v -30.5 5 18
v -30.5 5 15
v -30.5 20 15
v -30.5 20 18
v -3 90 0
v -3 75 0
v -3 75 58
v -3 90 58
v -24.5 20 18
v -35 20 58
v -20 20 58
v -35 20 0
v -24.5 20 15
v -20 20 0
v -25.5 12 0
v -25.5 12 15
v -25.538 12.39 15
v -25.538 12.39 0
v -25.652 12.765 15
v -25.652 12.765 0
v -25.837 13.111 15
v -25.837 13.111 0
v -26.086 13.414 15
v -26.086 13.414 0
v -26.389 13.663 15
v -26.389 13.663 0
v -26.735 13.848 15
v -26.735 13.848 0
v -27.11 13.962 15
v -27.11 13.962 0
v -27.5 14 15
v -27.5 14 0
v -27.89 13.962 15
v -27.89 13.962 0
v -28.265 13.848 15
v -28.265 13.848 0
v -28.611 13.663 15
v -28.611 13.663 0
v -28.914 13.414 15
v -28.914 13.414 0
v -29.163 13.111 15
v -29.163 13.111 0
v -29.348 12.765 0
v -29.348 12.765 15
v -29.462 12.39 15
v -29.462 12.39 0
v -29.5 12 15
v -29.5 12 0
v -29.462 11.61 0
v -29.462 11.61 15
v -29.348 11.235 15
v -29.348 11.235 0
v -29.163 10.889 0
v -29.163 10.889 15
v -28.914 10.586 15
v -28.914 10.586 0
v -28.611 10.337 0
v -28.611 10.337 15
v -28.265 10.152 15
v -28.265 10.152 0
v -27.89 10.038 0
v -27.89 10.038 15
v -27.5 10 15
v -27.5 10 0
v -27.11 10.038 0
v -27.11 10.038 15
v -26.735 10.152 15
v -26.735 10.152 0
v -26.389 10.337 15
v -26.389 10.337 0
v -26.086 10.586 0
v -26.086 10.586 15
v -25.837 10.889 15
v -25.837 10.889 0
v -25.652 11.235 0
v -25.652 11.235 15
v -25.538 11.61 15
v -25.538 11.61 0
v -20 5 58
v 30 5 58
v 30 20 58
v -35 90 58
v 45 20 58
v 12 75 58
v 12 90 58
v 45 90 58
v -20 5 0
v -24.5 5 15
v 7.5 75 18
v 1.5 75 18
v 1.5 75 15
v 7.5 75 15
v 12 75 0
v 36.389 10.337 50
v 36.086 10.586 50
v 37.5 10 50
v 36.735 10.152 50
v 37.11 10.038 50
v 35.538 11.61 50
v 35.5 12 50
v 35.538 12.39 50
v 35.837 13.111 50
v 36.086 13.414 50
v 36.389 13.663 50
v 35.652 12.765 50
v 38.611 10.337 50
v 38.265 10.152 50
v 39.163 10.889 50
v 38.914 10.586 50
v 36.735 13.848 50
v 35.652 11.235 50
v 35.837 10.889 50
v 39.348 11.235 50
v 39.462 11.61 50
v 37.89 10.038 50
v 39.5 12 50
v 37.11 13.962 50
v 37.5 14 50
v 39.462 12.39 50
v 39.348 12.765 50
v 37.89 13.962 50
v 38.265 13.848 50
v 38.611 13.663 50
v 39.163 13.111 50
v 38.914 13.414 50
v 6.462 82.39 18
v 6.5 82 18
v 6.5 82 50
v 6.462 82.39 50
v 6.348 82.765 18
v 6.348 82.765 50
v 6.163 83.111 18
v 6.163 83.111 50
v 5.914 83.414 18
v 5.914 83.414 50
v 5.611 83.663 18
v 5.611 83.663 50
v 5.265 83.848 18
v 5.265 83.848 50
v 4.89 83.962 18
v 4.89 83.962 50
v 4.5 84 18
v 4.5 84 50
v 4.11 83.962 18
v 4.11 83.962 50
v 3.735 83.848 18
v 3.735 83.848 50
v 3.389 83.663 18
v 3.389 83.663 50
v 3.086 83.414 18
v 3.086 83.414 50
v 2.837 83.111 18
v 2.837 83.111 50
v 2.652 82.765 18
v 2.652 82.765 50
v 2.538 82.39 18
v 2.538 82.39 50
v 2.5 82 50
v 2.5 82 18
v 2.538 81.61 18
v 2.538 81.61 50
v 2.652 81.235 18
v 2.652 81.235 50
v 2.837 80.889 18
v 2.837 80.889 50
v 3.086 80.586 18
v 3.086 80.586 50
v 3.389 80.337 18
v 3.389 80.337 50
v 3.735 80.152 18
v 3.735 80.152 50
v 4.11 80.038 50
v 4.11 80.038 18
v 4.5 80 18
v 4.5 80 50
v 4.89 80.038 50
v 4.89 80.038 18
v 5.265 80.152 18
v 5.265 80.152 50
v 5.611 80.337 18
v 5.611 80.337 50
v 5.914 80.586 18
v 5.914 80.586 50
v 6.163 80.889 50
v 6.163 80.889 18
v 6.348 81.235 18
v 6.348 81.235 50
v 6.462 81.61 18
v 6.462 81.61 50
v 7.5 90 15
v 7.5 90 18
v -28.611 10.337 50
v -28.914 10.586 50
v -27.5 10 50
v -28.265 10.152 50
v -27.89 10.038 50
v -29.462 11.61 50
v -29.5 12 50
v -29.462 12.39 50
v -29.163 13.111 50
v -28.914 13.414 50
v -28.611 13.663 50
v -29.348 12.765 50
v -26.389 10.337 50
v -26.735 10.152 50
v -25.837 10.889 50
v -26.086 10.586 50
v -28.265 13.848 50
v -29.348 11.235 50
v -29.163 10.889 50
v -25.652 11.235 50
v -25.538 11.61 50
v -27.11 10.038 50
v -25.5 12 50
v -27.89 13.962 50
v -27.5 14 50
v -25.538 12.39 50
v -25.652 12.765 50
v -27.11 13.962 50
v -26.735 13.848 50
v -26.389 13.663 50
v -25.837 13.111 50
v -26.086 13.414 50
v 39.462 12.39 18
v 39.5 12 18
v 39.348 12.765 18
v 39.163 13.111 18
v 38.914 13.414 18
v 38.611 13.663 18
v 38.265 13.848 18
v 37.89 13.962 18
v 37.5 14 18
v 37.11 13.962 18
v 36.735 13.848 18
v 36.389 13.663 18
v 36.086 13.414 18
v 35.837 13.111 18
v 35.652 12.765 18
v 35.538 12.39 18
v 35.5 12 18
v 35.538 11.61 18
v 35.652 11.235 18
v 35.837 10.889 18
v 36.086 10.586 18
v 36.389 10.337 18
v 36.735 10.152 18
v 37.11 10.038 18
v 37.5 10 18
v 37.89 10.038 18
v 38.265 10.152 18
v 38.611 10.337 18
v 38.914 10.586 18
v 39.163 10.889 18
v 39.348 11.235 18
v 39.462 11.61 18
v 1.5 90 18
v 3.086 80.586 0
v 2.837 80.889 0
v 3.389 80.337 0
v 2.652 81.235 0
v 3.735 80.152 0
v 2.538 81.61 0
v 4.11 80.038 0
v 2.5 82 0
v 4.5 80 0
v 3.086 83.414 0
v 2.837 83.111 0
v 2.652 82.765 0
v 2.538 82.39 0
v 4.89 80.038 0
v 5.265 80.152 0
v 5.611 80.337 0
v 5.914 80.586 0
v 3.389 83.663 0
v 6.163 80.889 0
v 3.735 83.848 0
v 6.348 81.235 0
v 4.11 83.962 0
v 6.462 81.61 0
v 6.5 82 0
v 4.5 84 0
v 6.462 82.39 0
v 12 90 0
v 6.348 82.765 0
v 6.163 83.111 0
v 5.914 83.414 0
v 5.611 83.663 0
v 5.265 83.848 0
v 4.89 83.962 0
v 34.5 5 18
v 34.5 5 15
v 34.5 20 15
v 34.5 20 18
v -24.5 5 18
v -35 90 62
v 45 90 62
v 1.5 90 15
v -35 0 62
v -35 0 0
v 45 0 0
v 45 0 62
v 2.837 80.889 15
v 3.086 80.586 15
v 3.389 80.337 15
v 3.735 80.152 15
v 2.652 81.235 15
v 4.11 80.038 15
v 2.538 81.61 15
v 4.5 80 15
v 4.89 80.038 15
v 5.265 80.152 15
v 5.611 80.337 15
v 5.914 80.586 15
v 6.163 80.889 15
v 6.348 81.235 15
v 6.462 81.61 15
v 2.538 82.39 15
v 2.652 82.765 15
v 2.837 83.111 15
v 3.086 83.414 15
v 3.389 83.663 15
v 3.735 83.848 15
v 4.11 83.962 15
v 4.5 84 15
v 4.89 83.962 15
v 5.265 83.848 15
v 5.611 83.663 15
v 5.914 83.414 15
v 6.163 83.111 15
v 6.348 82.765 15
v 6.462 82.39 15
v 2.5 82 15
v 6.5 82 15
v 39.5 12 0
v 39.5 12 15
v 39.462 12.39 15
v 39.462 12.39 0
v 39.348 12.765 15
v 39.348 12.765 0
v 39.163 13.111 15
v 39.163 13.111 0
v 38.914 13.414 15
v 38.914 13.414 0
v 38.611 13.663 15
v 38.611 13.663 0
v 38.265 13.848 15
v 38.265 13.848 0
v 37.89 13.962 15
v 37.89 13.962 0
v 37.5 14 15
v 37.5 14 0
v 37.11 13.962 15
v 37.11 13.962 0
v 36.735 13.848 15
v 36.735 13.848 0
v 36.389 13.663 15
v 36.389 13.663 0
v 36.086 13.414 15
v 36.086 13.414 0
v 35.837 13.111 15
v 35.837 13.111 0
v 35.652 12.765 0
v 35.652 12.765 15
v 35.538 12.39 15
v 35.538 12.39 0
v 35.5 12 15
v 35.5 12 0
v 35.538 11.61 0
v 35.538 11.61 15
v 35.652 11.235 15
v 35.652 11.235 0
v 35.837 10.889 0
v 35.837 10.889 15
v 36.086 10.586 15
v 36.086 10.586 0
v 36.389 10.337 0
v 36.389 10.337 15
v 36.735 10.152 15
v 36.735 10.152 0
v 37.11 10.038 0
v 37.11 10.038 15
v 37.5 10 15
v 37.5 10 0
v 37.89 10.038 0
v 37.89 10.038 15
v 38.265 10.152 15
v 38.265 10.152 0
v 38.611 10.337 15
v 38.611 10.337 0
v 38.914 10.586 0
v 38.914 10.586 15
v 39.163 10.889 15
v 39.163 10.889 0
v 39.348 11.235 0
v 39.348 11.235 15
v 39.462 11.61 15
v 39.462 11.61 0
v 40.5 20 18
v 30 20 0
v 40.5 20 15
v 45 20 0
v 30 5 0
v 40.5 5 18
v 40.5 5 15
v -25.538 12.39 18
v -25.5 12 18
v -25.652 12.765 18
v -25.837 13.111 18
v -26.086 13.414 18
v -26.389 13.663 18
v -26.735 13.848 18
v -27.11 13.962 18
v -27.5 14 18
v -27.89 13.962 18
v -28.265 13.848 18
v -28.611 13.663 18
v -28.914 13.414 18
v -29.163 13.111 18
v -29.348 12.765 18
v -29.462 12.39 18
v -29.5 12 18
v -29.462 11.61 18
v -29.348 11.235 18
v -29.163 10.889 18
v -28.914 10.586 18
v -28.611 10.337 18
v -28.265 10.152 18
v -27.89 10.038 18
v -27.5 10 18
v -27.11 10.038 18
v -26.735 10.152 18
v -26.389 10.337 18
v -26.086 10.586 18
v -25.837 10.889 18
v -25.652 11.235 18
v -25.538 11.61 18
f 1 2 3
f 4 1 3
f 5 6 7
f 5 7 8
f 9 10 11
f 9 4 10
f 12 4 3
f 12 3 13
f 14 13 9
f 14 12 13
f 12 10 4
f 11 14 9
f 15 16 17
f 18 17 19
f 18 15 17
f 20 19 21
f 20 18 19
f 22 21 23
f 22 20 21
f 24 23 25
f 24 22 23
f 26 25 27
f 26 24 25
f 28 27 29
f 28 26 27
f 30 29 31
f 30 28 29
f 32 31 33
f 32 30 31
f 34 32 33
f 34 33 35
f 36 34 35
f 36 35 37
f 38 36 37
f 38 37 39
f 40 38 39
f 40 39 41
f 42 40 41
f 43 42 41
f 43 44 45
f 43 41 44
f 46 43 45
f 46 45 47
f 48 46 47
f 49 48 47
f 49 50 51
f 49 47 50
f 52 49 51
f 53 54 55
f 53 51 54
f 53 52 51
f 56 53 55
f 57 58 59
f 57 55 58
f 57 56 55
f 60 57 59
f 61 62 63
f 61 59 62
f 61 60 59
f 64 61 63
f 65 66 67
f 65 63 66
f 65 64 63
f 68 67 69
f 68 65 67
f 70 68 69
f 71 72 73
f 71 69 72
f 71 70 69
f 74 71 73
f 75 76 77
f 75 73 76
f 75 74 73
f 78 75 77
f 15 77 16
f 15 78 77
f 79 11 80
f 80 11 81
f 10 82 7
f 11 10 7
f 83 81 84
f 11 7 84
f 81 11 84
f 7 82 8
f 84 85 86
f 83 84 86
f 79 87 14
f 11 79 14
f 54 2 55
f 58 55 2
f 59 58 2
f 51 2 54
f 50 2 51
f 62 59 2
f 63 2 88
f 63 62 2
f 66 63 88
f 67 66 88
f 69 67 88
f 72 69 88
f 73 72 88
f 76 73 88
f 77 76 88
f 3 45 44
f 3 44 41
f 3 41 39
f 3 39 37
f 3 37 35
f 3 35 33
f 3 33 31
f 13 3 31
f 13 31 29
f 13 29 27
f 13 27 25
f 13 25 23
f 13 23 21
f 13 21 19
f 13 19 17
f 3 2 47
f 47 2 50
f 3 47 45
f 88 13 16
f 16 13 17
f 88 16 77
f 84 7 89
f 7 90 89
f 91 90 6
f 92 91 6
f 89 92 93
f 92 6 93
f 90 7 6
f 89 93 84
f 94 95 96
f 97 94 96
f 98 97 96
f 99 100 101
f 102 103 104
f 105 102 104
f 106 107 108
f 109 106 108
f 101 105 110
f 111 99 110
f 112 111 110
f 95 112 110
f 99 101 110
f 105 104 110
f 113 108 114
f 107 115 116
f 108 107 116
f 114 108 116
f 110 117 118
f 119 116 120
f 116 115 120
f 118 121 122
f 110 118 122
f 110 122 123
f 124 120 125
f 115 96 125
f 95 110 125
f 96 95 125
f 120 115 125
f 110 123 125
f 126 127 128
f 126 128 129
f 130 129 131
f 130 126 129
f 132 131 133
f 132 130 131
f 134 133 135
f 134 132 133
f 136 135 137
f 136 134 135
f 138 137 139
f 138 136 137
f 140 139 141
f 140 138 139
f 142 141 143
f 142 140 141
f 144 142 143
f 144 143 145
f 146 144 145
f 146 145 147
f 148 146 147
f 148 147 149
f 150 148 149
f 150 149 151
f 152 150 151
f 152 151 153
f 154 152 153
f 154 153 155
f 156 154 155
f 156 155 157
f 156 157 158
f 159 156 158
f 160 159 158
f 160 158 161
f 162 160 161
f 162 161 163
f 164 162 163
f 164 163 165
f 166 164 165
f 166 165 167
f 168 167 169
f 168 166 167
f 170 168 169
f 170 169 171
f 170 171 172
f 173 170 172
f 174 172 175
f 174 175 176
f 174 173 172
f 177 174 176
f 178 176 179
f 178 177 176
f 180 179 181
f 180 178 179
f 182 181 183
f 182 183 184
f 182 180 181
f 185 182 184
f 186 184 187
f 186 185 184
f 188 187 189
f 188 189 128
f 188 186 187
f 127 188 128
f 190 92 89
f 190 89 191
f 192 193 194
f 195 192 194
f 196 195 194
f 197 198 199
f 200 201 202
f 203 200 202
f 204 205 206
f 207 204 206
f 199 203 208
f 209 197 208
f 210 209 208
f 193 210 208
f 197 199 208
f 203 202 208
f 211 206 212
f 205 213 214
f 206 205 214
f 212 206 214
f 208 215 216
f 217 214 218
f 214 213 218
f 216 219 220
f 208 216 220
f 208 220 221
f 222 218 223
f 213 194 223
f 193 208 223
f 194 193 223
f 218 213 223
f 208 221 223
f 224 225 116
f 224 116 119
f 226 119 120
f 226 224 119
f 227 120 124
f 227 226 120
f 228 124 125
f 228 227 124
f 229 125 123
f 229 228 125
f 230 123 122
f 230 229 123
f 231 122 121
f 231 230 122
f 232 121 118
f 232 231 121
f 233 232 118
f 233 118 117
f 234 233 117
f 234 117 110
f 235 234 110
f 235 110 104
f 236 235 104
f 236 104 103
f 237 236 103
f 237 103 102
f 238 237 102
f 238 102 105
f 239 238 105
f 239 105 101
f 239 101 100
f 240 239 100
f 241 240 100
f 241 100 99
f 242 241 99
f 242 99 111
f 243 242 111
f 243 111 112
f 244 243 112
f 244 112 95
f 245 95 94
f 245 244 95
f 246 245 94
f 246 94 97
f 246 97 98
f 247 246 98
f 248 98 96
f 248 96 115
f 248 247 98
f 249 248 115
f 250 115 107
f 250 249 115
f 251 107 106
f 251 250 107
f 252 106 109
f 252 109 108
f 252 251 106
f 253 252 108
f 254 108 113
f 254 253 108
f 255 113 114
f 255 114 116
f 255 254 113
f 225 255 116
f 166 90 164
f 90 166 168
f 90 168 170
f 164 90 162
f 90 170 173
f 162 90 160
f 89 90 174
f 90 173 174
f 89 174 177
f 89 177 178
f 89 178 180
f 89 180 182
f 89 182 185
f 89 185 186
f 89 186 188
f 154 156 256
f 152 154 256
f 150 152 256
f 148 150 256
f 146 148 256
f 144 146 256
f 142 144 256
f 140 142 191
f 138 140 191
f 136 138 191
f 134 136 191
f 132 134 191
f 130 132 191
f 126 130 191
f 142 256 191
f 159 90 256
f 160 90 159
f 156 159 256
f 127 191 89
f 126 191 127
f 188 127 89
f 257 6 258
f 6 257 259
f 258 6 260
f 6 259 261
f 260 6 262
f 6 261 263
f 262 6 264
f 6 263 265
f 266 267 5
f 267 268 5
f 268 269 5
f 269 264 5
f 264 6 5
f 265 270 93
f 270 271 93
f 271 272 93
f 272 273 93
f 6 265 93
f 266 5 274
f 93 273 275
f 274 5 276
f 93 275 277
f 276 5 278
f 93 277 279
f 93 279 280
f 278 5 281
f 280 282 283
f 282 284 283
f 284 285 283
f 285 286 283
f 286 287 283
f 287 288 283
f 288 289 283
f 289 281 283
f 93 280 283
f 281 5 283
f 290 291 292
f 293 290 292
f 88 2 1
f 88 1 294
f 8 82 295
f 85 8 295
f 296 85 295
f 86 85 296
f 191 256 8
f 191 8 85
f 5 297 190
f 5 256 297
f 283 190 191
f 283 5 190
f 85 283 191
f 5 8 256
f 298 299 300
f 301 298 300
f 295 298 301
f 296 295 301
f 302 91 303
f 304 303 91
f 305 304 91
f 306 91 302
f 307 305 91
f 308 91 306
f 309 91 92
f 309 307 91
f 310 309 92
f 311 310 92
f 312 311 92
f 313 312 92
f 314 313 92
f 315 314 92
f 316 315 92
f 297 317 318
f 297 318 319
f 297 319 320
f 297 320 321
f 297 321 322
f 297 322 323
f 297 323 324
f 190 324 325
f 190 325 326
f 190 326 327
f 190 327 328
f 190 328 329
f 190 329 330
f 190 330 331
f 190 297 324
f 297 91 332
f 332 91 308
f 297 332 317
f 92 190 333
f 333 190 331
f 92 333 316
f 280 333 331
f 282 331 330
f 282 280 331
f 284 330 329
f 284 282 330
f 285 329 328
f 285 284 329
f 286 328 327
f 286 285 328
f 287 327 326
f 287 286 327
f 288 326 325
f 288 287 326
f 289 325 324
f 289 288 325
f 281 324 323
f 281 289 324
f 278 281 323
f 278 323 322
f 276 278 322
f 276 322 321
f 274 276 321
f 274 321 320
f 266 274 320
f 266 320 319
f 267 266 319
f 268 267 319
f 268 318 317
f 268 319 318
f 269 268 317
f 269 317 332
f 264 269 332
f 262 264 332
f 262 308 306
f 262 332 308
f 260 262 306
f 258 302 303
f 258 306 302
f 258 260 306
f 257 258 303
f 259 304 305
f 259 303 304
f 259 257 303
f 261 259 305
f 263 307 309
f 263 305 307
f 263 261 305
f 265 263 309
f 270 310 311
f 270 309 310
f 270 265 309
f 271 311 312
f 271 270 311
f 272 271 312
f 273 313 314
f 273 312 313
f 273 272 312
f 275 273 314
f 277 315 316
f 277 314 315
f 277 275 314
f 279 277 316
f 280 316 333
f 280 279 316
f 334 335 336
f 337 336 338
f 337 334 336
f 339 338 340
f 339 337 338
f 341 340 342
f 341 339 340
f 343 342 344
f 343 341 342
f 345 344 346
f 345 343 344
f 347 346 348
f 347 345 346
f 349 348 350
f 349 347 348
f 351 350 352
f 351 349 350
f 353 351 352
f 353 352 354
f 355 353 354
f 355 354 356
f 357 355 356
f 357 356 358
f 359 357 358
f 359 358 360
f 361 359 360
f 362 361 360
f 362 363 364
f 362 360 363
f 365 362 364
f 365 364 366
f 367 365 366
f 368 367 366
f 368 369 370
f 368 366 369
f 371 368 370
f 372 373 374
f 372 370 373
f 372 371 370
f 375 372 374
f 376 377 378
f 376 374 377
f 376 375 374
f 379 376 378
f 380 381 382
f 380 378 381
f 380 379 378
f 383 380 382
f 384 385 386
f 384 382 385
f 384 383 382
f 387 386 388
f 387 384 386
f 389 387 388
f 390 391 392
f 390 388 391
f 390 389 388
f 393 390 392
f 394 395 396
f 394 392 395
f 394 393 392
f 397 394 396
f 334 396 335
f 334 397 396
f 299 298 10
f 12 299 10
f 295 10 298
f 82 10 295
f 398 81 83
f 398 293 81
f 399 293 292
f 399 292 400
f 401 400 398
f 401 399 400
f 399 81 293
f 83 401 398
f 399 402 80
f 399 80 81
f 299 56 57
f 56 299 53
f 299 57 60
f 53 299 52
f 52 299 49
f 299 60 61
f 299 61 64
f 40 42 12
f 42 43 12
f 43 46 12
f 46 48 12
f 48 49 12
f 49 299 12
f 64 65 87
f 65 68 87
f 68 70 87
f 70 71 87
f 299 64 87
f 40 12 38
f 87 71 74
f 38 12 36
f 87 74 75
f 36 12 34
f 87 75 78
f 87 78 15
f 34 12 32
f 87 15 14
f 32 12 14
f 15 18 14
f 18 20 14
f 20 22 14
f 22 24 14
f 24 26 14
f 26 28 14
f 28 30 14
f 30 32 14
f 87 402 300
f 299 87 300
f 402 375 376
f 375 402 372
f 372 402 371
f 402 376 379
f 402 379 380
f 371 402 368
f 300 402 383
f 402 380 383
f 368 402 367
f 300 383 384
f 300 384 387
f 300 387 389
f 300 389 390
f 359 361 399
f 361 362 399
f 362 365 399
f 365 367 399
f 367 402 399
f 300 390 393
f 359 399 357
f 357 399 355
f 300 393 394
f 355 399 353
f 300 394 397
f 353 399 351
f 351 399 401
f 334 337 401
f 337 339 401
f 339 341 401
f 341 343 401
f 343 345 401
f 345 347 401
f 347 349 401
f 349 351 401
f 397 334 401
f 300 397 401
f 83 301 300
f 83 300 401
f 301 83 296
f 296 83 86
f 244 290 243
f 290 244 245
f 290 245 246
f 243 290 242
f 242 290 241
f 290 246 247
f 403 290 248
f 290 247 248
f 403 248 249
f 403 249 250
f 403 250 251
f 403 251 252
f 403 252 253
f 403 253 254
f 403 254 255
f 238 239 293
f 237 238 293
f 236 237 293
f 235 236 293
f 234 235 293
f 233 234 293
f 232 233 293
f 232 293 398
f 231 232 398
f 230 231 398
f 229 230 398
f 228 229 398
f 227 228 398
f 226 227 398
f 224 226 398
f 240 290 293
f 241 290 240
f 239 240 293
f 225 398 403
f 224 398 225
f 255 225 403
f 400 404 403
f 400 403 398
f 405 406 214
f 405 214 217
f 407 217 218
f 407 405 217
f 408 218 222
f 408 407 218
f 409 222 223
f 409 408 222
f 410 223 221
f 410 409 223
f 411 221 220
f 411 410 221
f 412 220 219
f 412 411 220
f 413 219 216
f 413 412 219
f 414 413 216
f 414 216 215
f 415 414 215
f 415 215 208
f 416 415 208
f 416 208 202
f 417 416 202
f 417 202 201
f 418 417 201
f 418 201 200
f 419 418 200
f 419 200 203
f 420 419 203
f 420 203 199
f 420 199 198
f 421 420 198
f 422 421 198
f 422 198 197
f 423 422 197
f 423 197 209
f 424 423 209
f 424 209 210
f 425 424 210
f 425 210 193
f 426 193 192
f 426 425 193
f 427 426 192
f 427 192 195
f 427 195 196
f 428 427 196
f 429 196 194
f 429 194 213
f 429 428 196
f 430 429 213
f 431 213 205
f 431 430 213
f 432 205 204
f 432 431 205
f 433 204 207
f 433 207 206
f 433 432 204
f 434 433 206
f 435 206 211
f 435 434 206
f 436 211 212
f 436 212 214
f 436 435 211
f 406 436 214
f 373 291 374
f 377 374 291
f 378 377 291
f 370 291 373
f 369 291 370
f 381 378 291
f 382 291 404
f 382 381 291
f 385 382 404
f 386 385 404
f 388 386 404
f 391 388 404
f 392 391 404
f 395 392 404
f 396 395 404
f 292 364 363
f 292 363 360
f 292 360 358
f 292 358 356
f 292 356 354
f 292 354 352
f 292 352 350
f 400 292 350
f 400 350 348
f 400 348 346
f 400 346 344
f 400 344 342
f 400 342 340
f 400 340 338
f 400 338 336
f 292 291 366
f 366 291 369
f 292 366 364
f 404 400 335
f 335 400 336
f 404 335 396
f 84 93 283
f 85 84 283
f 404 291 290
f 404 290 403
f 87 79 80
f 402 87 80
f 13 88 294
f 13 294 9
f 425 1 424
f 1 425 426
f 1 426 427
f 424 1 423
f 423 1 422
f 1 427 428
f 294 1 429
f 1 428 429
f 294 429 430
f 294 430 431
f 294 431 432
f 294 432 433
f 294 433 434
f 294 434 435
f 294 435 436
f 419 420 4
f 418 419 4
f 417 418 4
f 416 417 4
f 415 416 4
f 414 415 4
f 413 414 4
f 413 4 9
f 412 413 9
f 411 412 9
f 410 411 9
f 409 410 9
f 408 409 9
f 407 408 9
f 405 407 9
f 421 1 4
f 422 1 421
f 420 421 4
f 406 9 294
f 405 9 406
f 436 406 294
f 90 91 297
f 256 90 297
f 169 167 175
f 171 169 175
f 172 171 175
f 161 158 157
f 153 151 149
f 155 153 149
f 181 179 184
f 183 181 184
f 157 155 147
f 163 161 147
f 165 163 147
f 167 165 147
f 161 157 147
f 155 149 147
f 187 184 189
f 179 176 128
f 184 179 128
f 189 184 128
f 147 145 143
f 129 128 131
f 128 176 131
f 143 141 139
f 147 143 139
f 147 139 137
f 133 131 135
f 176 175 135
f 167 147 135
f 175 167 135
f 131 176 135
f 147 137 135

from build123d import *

# Parameters (mm, degrees)
BOX035_W          = 6
BOX035_H          = 15
BOX035_DEPTH      = 3
CYLINDER018_R     = 2
CYLINDER018_DEPTH = 50
BOX_W             = 15
BOX_H             = 15
BOX_DEPTH         = 58
BOX038_W          = 80
BOX038_H          = 5
BOX038_DEPTH      = 58
BOX039_W          = 80
BOX039_H          = 90
BOX039_DEPTH      = 4


with BuildPart() as nut_hole:
    # Box035 → Box035 (new body)
    with BuildSketch(Plane(origin=(-8.5, 5, 15), x_dir=(1, 0, 0), z_dir=(0, 0, 1))):
        with Locations((3, 7.5)):
            Rectangle(BOX035_W, BOX035_H)
    extrude(amount=BOX035_DEPTH)


with BuildPart() as cylinder:
    # Cylinder018 → Cylinder018 (new body)
    with BuildSketch(Plane(origin=(-5.5, 12, 0), x_dir=(1, 0, 0), z_dir=(0, 0, 1))):
        Circle(CYLINDER018_R)
    extrude(amount=CYLINDER018_DEPTH)


with BuildPart() as cut:
    # Box → Box (new body)
    with BuildSketch(Plane(origin=(-13, 5, 0), x_dir=(1, 0, 0), z_dir=(0, 0, 1))):
        with Locations((7.5, 7.5)):
            Rectangle(BOX_W, BOX_H)
    extrude(amount=BOX_DEPTH)

    # Cut: cut Cylinder
    add(cylinder.part, mode=Mode.SUBTRACT)


with BuildPart() as cut037:
    # Cut037 base: copy of Cut
    add(cut.part)

    # Cut037: cut Nut hole
    add(nut_hole.part, mode=Mode.SUBTRACT)


with BuildPart() as cut037_1:
    # Cut037 placement: moved
    add(cut037.part.moved(Location((-22, 0, 0))))


with BuildPart() as cut038:
    # Cut038 base: copy of Cut
    add(cut.part)

    # Cut038: cut Nut hole
    add(nut_hole.part, mode=Mode.SUBTRACT)


with BuildPart() as cut038_1:
    # Cut038 placement: moved
    add(cut038.part.moved(Location((43, 0, 0))))


with BuildPart() as extension_supports:
    # Cut039 base: copy of Cut
    add(cut.part)

    # Cut039: cut Nut hole
    add(nut_hole.part, mode=Mode.SUBTRACT)


with BuildPart() as extension_supports_1:
    # Cut039 placement: moved
    add(extension_supports.part.moved(Location((10, 70, 0))))

    # Fusion082: union Cut037, Cut038
    add(cut037_1.part)
    add(cut038_1.part)


with BuildPart() as cube002:
    # Box038 → Box038 (new body)
    with BuildSketch(Plane(origin=(-35, 0, 0), x_dir=(1, 0, 0), z_dir=(0, 0, 1))):
        with Locations((40, 2.5)):
            Rectangle(BOX038_W, BOX038_H)
    extrude(amount=BOX038_DEPTH)


with BuildPart() as fusion084:
    # Box039 → Box039 (new body)
    with BuildSketch(Plane(origin=(-35, 0, 58), x_dir=(1, 0, 0), z_dir=(0, 0, 1))):
        with Locations((40, 45)):
            Rectangle(BOX039_W, BOX039_H)
    extrude(amount=BOX039_DEPTH)

    # Fusion081: union Cube002
    add(cube002.part)

    # Fusion084: union Extension supports
    add(extension_supports_1.part)


solid = fusion084.part
